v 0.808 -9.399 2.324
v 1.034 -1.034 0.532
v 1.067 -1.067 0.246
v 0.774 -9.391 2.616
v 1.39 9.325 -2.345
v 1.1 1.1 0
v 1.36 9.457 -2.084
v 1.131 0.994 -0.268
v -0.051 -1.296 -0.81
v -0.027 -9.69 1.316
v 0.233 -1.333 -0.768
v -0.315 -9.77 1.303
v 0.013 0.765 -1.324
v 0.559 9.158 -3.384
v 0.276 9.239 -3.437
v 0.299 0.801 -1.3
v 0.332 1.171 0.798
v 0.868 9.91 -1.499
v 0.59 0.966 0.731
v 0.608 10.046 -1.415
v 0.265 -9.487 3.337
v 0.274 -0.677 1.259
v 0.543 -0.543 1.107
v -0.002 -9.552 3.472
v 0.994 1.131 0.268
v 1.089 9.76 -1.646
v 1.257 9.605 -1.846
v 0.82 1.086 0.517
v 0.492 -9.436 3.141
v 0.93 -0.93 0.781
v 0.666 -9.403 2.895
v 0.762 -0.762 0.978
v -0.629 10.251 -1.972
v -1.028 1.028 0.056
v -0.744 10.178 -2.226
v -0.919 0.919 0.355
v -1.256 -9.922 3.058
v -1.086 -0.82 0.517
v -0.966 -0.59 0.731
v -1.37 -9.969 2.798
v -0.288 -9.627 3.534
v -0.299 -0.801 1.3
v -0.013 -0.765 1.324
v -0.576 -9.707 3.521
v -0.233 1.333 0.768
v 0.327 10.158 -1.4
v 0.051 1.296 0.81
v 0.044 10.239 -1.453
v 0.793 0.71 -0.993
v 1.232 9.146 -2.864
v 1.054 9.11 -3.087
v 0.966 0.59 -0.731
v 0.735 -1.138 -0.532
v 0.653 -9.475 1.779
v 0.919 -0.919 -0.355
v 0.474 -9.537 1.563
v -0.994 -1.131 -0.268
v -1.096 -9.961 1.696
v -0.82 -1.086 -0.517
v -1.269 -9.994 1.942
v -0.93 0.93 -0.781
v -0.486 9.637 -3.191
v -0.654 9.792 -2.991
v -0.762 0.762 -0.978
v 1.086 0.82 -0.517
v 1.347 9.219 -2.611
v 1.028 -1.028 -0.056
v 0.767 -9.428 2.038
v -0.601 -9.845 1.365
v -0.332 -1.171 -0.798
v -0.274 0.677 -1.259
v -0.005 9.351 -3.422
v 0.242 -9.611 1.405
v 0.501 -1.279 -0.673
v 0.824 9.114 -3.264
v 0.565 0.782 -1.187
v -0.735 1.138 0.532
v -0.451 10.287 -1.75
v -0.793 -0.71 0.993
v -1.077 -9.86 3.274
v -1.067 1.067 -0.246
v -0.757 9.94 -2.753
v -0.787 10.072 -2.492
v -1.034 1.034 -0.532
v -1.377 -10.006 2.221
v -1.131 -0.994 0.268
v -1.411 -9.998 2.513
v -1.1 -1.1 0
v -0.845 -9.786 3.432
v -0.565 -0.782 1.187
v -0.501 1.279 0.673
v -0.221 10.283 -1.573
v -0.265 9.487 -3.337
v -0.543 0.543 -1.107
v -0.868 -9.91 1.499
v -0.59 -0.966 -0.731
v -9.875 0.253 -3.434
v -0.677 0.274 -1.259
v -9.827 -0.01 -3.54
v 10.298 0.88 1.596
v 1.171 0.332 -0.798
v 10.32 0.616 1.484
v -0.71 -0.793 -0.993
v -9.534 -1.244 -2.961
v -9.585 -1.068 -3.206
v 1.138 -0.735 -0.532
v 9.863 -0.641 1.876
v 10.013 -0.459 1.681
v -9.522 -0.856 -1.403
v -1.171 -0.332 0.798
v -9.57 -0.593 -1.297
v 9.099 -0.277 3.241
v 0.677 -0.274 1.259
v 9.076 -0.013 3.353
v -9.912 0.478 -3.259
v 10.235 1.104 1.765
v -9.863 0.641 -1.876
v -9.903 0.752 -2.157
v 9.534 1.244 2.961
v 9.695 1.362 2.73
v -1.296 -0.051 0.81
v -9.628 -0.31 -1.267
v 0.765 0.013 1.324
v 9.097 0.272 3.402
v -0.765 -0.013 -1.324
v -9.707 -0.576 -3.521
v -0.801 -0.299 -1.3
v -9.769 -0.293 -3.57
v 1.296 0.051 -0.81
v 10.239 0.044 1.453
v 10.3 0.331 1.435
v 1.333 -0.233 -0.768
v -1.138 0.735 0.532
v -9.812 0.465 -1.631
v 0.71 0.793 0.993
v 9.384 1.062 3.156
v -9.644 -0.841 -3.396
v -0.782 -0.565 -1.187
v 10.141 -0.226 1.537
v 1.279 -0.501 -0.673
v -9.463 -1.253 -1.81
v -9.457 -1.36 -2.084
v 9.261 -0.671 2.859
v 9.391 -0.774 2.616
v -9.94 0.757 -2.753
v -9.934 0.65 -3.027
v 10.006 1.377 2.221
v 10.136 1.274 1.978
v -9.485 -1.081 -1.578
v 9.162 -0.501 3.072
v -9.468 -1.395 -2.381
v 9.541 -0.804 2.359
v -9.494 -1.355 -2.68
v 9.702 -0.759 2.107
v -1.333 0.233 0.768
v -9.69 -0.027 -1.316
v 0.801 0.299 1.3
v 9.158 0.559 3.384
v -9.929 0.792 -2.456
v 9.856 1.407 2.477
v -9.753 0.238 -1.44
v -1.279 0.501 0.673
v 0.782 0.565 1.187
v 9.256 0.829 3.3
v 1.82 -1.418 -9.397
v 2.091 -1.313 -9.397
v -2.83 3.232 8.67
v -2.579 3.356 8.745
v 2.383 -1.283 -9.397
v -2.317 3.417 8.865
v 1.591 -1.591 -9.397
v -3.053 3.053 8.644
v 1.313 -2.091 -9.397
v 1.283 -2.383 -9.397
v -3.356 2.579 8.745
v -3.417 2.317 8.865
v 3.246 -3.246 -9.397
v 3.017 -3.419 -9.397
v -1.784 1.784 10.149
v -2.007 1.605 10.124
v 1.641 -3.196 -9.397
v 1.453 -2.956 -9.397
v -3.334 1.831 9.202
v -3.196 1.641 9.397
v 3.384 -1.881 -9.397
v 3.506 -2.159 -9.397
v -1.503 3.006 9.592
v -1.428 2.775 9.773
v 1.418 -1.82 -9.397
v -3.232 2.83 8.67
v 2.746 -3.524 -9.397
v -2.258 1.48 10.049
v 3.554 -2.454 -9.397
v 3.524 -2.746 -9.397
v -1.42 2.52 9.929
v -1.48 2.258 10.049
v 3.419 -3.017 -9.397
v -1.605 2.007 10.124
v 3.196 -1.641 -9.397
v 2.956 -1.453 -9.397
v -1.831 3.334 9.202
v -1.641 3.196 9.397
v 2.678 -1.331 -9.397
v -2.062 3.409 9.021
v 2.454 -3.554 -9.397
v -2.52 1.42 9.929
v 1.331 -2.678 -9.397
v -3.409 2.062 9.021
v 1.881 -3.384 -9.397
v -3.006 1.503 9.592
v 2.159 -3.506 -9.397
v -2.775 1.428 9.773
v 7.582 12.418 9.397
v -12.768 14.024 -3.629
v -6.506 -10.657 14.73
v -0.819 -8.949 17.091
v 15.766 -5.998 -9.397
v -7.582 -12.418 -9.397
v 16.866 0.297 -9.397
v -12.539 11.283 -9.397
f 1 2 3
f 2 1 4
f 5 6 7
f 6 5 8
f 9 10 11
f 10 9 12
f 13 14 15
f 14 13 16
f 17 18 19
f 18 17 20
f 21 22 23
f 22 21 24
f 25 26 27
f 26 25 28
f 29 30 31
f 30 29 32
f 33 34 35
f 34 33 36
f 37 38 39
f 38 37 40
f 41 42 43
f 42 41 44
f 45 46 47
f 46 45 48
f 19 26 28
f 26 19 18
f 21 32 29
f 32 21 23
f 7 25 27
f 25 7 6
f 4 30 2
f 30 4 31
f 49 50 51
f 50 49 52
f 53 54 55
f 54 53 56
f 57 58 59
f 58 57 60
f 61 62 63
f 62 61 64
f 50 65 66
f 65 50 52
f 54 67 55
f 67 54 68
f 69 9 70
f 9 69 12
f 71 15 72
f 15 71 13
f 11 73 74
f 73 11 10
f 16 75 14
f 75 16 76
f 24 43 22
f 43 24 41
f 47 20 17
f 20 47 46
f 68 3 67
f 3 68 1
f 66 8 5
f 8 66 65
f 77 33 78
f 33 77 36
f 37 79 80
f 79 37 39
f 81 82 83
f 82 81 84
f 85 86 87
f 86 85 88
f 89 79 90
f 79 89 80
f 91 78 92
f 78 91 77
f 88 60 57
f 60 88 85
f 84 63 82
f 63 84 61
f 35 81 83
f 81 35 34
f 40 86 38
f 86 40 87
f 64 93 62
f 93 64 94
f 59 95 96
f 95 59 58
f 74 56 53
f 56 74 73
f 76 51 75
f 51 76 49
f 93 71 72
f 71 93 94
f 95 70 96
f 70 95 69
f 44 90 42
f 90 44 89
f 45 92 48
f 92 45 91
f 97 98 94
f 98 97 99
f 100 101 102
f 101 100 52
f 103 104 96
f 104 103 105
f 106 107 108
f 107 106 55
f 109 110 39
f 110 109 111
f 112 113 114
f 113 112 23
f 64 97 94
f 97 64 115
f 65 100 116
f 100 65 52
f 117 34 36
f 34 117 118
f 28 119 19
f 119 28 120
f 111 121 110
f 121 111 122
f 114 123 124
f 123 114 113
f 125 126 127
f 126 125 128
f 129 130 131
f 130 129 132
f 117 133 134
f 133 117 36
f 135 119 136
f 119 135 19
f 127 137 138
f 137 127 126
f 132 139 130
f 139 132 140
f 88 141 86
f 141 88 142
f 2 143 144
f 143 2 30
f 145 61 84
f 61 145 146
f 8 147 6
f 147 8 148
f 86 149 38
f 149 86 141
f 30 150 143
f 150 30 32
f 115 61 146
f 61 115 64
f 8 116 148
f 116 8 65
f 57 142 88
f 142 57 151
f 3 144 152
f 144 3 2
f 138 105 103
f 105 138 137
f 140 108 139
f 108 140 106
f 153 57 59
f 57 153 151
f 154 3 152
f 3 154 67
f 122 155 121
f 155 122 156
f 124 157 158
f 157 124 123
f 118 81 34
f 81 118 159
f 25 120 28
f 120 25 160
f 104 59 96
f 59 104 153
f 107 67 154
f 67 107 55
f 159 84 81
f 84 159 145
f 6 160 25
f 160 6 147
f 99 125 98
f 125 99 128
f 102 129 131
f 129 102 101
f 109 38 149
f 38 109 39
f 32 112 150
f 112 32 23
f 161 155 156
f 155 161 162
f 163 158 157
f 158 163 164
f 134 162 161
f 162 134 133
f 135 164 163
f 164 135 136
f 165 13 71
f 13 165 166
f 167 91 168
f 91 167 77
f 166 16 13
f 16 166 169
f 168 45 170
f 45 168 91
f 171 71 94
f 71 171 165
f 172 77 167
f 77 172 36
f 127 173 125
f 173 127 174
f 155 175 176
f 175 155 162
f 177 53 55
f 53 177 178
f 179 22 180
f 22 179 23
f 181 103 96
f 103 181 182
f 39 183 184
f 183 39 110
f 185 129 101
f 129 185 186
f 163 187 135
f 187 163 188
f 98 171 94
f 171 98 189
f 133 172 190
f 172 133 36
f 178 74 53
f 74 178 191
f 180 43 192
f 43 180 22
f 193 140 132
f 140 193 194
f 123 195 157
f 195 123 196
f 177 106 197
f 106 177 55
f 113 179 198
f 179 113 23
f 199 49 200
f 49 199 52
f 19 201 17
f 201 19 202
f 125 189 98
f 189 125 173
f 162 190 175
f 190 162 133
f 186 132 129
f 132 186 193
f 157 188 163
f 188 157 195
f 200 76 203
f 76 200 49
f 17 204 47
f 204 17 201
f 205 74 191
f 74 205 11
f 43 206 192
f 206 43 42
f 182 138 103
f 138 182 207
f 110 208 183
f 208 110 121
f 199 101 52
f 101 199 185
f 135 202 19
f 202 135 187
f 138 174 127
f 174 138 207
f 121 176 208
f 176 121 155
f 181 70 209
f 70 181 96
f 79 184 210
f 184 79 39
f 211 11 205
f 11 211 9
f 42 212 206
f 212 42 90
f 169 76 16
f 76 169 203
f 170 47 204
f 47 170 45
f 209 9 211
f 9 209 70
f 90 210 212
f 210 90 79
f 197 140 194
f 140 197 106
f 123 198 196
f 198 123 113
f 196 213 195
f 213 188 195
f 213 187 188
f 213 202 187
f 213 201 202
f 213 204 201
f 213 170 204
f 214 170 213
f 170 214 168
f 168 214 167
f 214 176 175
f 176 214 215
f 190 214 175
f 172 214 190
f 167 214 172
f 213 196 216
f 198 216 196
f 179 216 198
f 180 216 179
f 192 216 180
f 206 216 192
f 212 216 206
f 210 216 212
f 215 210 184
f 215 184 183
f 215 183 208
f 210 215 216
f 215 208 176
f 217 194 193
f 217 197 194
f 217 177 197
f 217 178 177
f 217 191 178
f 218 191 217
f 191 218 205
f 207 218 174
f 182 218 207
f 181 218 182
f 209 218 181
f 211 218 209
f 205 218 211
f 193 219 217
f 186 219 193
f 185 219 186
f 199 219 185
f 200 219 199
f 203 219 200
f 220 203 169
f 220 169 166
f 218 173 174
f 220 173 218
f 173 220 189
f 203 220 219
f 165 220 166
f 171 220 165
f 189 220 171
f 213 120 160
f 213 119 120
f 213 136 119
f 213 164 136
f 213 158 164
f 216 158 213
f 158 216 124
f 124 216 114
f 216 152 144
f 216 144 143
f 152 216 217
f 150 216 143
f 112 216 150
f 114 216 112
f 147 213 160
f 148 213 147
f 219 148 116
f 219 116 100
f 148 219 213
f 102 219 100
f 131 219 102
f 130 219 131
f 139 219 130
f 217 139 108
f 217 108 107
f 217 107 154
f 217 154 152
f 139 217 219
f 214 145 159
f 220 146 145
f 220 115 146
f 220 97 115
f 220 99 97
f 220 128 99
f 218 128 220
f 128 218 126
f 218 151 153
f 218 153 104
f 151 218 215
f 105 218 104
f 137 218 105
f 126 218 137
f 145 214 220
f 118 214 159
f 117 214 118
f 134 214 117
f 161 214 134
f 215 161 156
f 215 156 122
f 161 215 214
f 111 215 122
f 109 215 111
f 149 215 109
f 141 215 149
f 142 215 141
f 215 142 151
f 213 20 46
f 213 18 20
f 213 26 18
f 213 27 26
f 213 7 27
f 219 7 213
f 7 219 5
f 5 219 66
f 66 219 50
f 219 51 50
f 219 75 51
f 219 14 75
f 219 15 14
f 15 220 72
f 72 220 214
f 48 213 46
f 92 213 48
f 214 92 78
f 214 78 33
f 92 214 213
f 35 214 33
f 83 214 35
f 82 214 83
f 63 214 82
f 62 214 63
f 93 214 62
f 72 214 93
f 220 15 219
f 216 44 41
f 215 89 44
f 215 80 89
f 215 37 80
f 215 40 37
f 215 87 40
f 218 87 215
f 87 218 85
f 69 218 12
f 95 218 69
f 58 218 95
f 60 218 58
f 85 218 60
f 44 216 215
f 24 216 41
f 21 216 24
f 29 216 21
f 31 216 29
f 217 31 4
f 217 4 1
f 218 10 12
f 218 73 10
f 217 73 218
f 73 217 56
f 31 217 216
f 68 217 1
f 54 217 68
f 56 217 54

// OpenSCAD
/*
Элемент самозаклинивающейся структуры Канель-Белова.
Скошенный по шести граням куб + сквозные отверстия для креплений.
С настраиваемыми параметрами в программе OpenSCAD.

Программист: Полозков Сергей.
Смена в Сириусе "самозаклинивающиеся структуры" в 2023 году.
*/

//Шаг сетки (межцентровое расстояние)
STEP_GRID = 20;

//угол для грани (наклон по диагонали)
DEG = 20;

//такой n-угольник для детализации отверстия
HOLE_DETALISATION = 24;

//диаметр отвертия (диаметр описанной окружности около многоугольника детализации)
//если диаметр = 0, то отверстий нет, 2.2 = диаметр зубочистки
HOLE_DIAMETR = 2.2;



//50% of grid cube side
HALF = STEP_GRID * 0.5;

//auxiliary variables (for correct cutting)
SCALE_FOR_CORE = 6;
SIZES_EXTRA = [HALF * SCALE_FOR_CORE, HALF * SCALE_FOR_CORE, HALF * SCALE_FOR_CORE];
BIG = HALF * 20;

//orts for 6 directions
P_X = [1,0,0]; M_X = [-1,0,0]; 
P_Y = [0,1,0]; M_Y = [0,-1,0];
P_Z = [0,0,1]; M_Z = [0,0,-1];

//three cyliners for holes for connection
module m_cross_holes(fn = HOLE_DETALISATION, d = HOLE_DIAMETR, half_h_total = STEP_GRID) {
    if (HOLE_DIAMETR > 0) {
        rotate([90,0,0]) cylinder(h = half_h_total * 2, d = d, $fn = fn, center = true);
        rotate([0,90,0]) cylinder(h = half_h_total * 2, d = d, $fn = fn, center = true);
        rotate([0,0,90]) cylinder(h = half_h_total * 2, d = d, $fn = fn, center = true);
    }
}

//rotated and translated (shifted) cube, that cut face of core cube
module m_cube(rotate_v = [1,1,0], rotate_a = 20, ORT = [0, 0, 1]) {
    dx = ORT[0]; dy = ORT[1]; dz = ORT[2];
    
    //center of the rotation line segment is equal cutting face
    translate(v = [dx * HALF, dy * HALF, dz * HALF])
        //rotate on axe this cutting face (on the big cube)
        rotate (v = rotate_v, a = rotate_a)
            //make big cube's face on zero level
            translate(v = [dx * BIG  / 2, dy * BIG  / 2, dz * BIG  / 2])  
                cube ([BIG, BIG, BIG], center = true);
}

//cut 6 faces of the core cube
module m_element(CENTER = [0,0,0], rotate_a = 0, rotate_v = [0,0,1], DEG = DEG) {
    translate ([CENTER[0] * HALF * 2, CENTER[1] * HALF * 2, CENTER[2] * HALF * 2])
        rotate (v = rotate_v, a = rotate_a)
            difference () {
                cube (SIZES_EXTRA, center = true);
                
                //cut ooposite faces
                m_cube([1,1,0], -DEG, P_Z); m_cube([1,1,0], DEG, M_Z);
                m_cube([0,1,1], -DEG, P_X); m_cube([0,1,1], DEG, M_X);
                m_cube([1,0,1], -DEG, P_Y);  m_cube([1,0,1], DEG, M_Y);
                
                m_cross_holes();
           }
}

rotate (v = [1,1,0], a = -DEG)
    m_element();
